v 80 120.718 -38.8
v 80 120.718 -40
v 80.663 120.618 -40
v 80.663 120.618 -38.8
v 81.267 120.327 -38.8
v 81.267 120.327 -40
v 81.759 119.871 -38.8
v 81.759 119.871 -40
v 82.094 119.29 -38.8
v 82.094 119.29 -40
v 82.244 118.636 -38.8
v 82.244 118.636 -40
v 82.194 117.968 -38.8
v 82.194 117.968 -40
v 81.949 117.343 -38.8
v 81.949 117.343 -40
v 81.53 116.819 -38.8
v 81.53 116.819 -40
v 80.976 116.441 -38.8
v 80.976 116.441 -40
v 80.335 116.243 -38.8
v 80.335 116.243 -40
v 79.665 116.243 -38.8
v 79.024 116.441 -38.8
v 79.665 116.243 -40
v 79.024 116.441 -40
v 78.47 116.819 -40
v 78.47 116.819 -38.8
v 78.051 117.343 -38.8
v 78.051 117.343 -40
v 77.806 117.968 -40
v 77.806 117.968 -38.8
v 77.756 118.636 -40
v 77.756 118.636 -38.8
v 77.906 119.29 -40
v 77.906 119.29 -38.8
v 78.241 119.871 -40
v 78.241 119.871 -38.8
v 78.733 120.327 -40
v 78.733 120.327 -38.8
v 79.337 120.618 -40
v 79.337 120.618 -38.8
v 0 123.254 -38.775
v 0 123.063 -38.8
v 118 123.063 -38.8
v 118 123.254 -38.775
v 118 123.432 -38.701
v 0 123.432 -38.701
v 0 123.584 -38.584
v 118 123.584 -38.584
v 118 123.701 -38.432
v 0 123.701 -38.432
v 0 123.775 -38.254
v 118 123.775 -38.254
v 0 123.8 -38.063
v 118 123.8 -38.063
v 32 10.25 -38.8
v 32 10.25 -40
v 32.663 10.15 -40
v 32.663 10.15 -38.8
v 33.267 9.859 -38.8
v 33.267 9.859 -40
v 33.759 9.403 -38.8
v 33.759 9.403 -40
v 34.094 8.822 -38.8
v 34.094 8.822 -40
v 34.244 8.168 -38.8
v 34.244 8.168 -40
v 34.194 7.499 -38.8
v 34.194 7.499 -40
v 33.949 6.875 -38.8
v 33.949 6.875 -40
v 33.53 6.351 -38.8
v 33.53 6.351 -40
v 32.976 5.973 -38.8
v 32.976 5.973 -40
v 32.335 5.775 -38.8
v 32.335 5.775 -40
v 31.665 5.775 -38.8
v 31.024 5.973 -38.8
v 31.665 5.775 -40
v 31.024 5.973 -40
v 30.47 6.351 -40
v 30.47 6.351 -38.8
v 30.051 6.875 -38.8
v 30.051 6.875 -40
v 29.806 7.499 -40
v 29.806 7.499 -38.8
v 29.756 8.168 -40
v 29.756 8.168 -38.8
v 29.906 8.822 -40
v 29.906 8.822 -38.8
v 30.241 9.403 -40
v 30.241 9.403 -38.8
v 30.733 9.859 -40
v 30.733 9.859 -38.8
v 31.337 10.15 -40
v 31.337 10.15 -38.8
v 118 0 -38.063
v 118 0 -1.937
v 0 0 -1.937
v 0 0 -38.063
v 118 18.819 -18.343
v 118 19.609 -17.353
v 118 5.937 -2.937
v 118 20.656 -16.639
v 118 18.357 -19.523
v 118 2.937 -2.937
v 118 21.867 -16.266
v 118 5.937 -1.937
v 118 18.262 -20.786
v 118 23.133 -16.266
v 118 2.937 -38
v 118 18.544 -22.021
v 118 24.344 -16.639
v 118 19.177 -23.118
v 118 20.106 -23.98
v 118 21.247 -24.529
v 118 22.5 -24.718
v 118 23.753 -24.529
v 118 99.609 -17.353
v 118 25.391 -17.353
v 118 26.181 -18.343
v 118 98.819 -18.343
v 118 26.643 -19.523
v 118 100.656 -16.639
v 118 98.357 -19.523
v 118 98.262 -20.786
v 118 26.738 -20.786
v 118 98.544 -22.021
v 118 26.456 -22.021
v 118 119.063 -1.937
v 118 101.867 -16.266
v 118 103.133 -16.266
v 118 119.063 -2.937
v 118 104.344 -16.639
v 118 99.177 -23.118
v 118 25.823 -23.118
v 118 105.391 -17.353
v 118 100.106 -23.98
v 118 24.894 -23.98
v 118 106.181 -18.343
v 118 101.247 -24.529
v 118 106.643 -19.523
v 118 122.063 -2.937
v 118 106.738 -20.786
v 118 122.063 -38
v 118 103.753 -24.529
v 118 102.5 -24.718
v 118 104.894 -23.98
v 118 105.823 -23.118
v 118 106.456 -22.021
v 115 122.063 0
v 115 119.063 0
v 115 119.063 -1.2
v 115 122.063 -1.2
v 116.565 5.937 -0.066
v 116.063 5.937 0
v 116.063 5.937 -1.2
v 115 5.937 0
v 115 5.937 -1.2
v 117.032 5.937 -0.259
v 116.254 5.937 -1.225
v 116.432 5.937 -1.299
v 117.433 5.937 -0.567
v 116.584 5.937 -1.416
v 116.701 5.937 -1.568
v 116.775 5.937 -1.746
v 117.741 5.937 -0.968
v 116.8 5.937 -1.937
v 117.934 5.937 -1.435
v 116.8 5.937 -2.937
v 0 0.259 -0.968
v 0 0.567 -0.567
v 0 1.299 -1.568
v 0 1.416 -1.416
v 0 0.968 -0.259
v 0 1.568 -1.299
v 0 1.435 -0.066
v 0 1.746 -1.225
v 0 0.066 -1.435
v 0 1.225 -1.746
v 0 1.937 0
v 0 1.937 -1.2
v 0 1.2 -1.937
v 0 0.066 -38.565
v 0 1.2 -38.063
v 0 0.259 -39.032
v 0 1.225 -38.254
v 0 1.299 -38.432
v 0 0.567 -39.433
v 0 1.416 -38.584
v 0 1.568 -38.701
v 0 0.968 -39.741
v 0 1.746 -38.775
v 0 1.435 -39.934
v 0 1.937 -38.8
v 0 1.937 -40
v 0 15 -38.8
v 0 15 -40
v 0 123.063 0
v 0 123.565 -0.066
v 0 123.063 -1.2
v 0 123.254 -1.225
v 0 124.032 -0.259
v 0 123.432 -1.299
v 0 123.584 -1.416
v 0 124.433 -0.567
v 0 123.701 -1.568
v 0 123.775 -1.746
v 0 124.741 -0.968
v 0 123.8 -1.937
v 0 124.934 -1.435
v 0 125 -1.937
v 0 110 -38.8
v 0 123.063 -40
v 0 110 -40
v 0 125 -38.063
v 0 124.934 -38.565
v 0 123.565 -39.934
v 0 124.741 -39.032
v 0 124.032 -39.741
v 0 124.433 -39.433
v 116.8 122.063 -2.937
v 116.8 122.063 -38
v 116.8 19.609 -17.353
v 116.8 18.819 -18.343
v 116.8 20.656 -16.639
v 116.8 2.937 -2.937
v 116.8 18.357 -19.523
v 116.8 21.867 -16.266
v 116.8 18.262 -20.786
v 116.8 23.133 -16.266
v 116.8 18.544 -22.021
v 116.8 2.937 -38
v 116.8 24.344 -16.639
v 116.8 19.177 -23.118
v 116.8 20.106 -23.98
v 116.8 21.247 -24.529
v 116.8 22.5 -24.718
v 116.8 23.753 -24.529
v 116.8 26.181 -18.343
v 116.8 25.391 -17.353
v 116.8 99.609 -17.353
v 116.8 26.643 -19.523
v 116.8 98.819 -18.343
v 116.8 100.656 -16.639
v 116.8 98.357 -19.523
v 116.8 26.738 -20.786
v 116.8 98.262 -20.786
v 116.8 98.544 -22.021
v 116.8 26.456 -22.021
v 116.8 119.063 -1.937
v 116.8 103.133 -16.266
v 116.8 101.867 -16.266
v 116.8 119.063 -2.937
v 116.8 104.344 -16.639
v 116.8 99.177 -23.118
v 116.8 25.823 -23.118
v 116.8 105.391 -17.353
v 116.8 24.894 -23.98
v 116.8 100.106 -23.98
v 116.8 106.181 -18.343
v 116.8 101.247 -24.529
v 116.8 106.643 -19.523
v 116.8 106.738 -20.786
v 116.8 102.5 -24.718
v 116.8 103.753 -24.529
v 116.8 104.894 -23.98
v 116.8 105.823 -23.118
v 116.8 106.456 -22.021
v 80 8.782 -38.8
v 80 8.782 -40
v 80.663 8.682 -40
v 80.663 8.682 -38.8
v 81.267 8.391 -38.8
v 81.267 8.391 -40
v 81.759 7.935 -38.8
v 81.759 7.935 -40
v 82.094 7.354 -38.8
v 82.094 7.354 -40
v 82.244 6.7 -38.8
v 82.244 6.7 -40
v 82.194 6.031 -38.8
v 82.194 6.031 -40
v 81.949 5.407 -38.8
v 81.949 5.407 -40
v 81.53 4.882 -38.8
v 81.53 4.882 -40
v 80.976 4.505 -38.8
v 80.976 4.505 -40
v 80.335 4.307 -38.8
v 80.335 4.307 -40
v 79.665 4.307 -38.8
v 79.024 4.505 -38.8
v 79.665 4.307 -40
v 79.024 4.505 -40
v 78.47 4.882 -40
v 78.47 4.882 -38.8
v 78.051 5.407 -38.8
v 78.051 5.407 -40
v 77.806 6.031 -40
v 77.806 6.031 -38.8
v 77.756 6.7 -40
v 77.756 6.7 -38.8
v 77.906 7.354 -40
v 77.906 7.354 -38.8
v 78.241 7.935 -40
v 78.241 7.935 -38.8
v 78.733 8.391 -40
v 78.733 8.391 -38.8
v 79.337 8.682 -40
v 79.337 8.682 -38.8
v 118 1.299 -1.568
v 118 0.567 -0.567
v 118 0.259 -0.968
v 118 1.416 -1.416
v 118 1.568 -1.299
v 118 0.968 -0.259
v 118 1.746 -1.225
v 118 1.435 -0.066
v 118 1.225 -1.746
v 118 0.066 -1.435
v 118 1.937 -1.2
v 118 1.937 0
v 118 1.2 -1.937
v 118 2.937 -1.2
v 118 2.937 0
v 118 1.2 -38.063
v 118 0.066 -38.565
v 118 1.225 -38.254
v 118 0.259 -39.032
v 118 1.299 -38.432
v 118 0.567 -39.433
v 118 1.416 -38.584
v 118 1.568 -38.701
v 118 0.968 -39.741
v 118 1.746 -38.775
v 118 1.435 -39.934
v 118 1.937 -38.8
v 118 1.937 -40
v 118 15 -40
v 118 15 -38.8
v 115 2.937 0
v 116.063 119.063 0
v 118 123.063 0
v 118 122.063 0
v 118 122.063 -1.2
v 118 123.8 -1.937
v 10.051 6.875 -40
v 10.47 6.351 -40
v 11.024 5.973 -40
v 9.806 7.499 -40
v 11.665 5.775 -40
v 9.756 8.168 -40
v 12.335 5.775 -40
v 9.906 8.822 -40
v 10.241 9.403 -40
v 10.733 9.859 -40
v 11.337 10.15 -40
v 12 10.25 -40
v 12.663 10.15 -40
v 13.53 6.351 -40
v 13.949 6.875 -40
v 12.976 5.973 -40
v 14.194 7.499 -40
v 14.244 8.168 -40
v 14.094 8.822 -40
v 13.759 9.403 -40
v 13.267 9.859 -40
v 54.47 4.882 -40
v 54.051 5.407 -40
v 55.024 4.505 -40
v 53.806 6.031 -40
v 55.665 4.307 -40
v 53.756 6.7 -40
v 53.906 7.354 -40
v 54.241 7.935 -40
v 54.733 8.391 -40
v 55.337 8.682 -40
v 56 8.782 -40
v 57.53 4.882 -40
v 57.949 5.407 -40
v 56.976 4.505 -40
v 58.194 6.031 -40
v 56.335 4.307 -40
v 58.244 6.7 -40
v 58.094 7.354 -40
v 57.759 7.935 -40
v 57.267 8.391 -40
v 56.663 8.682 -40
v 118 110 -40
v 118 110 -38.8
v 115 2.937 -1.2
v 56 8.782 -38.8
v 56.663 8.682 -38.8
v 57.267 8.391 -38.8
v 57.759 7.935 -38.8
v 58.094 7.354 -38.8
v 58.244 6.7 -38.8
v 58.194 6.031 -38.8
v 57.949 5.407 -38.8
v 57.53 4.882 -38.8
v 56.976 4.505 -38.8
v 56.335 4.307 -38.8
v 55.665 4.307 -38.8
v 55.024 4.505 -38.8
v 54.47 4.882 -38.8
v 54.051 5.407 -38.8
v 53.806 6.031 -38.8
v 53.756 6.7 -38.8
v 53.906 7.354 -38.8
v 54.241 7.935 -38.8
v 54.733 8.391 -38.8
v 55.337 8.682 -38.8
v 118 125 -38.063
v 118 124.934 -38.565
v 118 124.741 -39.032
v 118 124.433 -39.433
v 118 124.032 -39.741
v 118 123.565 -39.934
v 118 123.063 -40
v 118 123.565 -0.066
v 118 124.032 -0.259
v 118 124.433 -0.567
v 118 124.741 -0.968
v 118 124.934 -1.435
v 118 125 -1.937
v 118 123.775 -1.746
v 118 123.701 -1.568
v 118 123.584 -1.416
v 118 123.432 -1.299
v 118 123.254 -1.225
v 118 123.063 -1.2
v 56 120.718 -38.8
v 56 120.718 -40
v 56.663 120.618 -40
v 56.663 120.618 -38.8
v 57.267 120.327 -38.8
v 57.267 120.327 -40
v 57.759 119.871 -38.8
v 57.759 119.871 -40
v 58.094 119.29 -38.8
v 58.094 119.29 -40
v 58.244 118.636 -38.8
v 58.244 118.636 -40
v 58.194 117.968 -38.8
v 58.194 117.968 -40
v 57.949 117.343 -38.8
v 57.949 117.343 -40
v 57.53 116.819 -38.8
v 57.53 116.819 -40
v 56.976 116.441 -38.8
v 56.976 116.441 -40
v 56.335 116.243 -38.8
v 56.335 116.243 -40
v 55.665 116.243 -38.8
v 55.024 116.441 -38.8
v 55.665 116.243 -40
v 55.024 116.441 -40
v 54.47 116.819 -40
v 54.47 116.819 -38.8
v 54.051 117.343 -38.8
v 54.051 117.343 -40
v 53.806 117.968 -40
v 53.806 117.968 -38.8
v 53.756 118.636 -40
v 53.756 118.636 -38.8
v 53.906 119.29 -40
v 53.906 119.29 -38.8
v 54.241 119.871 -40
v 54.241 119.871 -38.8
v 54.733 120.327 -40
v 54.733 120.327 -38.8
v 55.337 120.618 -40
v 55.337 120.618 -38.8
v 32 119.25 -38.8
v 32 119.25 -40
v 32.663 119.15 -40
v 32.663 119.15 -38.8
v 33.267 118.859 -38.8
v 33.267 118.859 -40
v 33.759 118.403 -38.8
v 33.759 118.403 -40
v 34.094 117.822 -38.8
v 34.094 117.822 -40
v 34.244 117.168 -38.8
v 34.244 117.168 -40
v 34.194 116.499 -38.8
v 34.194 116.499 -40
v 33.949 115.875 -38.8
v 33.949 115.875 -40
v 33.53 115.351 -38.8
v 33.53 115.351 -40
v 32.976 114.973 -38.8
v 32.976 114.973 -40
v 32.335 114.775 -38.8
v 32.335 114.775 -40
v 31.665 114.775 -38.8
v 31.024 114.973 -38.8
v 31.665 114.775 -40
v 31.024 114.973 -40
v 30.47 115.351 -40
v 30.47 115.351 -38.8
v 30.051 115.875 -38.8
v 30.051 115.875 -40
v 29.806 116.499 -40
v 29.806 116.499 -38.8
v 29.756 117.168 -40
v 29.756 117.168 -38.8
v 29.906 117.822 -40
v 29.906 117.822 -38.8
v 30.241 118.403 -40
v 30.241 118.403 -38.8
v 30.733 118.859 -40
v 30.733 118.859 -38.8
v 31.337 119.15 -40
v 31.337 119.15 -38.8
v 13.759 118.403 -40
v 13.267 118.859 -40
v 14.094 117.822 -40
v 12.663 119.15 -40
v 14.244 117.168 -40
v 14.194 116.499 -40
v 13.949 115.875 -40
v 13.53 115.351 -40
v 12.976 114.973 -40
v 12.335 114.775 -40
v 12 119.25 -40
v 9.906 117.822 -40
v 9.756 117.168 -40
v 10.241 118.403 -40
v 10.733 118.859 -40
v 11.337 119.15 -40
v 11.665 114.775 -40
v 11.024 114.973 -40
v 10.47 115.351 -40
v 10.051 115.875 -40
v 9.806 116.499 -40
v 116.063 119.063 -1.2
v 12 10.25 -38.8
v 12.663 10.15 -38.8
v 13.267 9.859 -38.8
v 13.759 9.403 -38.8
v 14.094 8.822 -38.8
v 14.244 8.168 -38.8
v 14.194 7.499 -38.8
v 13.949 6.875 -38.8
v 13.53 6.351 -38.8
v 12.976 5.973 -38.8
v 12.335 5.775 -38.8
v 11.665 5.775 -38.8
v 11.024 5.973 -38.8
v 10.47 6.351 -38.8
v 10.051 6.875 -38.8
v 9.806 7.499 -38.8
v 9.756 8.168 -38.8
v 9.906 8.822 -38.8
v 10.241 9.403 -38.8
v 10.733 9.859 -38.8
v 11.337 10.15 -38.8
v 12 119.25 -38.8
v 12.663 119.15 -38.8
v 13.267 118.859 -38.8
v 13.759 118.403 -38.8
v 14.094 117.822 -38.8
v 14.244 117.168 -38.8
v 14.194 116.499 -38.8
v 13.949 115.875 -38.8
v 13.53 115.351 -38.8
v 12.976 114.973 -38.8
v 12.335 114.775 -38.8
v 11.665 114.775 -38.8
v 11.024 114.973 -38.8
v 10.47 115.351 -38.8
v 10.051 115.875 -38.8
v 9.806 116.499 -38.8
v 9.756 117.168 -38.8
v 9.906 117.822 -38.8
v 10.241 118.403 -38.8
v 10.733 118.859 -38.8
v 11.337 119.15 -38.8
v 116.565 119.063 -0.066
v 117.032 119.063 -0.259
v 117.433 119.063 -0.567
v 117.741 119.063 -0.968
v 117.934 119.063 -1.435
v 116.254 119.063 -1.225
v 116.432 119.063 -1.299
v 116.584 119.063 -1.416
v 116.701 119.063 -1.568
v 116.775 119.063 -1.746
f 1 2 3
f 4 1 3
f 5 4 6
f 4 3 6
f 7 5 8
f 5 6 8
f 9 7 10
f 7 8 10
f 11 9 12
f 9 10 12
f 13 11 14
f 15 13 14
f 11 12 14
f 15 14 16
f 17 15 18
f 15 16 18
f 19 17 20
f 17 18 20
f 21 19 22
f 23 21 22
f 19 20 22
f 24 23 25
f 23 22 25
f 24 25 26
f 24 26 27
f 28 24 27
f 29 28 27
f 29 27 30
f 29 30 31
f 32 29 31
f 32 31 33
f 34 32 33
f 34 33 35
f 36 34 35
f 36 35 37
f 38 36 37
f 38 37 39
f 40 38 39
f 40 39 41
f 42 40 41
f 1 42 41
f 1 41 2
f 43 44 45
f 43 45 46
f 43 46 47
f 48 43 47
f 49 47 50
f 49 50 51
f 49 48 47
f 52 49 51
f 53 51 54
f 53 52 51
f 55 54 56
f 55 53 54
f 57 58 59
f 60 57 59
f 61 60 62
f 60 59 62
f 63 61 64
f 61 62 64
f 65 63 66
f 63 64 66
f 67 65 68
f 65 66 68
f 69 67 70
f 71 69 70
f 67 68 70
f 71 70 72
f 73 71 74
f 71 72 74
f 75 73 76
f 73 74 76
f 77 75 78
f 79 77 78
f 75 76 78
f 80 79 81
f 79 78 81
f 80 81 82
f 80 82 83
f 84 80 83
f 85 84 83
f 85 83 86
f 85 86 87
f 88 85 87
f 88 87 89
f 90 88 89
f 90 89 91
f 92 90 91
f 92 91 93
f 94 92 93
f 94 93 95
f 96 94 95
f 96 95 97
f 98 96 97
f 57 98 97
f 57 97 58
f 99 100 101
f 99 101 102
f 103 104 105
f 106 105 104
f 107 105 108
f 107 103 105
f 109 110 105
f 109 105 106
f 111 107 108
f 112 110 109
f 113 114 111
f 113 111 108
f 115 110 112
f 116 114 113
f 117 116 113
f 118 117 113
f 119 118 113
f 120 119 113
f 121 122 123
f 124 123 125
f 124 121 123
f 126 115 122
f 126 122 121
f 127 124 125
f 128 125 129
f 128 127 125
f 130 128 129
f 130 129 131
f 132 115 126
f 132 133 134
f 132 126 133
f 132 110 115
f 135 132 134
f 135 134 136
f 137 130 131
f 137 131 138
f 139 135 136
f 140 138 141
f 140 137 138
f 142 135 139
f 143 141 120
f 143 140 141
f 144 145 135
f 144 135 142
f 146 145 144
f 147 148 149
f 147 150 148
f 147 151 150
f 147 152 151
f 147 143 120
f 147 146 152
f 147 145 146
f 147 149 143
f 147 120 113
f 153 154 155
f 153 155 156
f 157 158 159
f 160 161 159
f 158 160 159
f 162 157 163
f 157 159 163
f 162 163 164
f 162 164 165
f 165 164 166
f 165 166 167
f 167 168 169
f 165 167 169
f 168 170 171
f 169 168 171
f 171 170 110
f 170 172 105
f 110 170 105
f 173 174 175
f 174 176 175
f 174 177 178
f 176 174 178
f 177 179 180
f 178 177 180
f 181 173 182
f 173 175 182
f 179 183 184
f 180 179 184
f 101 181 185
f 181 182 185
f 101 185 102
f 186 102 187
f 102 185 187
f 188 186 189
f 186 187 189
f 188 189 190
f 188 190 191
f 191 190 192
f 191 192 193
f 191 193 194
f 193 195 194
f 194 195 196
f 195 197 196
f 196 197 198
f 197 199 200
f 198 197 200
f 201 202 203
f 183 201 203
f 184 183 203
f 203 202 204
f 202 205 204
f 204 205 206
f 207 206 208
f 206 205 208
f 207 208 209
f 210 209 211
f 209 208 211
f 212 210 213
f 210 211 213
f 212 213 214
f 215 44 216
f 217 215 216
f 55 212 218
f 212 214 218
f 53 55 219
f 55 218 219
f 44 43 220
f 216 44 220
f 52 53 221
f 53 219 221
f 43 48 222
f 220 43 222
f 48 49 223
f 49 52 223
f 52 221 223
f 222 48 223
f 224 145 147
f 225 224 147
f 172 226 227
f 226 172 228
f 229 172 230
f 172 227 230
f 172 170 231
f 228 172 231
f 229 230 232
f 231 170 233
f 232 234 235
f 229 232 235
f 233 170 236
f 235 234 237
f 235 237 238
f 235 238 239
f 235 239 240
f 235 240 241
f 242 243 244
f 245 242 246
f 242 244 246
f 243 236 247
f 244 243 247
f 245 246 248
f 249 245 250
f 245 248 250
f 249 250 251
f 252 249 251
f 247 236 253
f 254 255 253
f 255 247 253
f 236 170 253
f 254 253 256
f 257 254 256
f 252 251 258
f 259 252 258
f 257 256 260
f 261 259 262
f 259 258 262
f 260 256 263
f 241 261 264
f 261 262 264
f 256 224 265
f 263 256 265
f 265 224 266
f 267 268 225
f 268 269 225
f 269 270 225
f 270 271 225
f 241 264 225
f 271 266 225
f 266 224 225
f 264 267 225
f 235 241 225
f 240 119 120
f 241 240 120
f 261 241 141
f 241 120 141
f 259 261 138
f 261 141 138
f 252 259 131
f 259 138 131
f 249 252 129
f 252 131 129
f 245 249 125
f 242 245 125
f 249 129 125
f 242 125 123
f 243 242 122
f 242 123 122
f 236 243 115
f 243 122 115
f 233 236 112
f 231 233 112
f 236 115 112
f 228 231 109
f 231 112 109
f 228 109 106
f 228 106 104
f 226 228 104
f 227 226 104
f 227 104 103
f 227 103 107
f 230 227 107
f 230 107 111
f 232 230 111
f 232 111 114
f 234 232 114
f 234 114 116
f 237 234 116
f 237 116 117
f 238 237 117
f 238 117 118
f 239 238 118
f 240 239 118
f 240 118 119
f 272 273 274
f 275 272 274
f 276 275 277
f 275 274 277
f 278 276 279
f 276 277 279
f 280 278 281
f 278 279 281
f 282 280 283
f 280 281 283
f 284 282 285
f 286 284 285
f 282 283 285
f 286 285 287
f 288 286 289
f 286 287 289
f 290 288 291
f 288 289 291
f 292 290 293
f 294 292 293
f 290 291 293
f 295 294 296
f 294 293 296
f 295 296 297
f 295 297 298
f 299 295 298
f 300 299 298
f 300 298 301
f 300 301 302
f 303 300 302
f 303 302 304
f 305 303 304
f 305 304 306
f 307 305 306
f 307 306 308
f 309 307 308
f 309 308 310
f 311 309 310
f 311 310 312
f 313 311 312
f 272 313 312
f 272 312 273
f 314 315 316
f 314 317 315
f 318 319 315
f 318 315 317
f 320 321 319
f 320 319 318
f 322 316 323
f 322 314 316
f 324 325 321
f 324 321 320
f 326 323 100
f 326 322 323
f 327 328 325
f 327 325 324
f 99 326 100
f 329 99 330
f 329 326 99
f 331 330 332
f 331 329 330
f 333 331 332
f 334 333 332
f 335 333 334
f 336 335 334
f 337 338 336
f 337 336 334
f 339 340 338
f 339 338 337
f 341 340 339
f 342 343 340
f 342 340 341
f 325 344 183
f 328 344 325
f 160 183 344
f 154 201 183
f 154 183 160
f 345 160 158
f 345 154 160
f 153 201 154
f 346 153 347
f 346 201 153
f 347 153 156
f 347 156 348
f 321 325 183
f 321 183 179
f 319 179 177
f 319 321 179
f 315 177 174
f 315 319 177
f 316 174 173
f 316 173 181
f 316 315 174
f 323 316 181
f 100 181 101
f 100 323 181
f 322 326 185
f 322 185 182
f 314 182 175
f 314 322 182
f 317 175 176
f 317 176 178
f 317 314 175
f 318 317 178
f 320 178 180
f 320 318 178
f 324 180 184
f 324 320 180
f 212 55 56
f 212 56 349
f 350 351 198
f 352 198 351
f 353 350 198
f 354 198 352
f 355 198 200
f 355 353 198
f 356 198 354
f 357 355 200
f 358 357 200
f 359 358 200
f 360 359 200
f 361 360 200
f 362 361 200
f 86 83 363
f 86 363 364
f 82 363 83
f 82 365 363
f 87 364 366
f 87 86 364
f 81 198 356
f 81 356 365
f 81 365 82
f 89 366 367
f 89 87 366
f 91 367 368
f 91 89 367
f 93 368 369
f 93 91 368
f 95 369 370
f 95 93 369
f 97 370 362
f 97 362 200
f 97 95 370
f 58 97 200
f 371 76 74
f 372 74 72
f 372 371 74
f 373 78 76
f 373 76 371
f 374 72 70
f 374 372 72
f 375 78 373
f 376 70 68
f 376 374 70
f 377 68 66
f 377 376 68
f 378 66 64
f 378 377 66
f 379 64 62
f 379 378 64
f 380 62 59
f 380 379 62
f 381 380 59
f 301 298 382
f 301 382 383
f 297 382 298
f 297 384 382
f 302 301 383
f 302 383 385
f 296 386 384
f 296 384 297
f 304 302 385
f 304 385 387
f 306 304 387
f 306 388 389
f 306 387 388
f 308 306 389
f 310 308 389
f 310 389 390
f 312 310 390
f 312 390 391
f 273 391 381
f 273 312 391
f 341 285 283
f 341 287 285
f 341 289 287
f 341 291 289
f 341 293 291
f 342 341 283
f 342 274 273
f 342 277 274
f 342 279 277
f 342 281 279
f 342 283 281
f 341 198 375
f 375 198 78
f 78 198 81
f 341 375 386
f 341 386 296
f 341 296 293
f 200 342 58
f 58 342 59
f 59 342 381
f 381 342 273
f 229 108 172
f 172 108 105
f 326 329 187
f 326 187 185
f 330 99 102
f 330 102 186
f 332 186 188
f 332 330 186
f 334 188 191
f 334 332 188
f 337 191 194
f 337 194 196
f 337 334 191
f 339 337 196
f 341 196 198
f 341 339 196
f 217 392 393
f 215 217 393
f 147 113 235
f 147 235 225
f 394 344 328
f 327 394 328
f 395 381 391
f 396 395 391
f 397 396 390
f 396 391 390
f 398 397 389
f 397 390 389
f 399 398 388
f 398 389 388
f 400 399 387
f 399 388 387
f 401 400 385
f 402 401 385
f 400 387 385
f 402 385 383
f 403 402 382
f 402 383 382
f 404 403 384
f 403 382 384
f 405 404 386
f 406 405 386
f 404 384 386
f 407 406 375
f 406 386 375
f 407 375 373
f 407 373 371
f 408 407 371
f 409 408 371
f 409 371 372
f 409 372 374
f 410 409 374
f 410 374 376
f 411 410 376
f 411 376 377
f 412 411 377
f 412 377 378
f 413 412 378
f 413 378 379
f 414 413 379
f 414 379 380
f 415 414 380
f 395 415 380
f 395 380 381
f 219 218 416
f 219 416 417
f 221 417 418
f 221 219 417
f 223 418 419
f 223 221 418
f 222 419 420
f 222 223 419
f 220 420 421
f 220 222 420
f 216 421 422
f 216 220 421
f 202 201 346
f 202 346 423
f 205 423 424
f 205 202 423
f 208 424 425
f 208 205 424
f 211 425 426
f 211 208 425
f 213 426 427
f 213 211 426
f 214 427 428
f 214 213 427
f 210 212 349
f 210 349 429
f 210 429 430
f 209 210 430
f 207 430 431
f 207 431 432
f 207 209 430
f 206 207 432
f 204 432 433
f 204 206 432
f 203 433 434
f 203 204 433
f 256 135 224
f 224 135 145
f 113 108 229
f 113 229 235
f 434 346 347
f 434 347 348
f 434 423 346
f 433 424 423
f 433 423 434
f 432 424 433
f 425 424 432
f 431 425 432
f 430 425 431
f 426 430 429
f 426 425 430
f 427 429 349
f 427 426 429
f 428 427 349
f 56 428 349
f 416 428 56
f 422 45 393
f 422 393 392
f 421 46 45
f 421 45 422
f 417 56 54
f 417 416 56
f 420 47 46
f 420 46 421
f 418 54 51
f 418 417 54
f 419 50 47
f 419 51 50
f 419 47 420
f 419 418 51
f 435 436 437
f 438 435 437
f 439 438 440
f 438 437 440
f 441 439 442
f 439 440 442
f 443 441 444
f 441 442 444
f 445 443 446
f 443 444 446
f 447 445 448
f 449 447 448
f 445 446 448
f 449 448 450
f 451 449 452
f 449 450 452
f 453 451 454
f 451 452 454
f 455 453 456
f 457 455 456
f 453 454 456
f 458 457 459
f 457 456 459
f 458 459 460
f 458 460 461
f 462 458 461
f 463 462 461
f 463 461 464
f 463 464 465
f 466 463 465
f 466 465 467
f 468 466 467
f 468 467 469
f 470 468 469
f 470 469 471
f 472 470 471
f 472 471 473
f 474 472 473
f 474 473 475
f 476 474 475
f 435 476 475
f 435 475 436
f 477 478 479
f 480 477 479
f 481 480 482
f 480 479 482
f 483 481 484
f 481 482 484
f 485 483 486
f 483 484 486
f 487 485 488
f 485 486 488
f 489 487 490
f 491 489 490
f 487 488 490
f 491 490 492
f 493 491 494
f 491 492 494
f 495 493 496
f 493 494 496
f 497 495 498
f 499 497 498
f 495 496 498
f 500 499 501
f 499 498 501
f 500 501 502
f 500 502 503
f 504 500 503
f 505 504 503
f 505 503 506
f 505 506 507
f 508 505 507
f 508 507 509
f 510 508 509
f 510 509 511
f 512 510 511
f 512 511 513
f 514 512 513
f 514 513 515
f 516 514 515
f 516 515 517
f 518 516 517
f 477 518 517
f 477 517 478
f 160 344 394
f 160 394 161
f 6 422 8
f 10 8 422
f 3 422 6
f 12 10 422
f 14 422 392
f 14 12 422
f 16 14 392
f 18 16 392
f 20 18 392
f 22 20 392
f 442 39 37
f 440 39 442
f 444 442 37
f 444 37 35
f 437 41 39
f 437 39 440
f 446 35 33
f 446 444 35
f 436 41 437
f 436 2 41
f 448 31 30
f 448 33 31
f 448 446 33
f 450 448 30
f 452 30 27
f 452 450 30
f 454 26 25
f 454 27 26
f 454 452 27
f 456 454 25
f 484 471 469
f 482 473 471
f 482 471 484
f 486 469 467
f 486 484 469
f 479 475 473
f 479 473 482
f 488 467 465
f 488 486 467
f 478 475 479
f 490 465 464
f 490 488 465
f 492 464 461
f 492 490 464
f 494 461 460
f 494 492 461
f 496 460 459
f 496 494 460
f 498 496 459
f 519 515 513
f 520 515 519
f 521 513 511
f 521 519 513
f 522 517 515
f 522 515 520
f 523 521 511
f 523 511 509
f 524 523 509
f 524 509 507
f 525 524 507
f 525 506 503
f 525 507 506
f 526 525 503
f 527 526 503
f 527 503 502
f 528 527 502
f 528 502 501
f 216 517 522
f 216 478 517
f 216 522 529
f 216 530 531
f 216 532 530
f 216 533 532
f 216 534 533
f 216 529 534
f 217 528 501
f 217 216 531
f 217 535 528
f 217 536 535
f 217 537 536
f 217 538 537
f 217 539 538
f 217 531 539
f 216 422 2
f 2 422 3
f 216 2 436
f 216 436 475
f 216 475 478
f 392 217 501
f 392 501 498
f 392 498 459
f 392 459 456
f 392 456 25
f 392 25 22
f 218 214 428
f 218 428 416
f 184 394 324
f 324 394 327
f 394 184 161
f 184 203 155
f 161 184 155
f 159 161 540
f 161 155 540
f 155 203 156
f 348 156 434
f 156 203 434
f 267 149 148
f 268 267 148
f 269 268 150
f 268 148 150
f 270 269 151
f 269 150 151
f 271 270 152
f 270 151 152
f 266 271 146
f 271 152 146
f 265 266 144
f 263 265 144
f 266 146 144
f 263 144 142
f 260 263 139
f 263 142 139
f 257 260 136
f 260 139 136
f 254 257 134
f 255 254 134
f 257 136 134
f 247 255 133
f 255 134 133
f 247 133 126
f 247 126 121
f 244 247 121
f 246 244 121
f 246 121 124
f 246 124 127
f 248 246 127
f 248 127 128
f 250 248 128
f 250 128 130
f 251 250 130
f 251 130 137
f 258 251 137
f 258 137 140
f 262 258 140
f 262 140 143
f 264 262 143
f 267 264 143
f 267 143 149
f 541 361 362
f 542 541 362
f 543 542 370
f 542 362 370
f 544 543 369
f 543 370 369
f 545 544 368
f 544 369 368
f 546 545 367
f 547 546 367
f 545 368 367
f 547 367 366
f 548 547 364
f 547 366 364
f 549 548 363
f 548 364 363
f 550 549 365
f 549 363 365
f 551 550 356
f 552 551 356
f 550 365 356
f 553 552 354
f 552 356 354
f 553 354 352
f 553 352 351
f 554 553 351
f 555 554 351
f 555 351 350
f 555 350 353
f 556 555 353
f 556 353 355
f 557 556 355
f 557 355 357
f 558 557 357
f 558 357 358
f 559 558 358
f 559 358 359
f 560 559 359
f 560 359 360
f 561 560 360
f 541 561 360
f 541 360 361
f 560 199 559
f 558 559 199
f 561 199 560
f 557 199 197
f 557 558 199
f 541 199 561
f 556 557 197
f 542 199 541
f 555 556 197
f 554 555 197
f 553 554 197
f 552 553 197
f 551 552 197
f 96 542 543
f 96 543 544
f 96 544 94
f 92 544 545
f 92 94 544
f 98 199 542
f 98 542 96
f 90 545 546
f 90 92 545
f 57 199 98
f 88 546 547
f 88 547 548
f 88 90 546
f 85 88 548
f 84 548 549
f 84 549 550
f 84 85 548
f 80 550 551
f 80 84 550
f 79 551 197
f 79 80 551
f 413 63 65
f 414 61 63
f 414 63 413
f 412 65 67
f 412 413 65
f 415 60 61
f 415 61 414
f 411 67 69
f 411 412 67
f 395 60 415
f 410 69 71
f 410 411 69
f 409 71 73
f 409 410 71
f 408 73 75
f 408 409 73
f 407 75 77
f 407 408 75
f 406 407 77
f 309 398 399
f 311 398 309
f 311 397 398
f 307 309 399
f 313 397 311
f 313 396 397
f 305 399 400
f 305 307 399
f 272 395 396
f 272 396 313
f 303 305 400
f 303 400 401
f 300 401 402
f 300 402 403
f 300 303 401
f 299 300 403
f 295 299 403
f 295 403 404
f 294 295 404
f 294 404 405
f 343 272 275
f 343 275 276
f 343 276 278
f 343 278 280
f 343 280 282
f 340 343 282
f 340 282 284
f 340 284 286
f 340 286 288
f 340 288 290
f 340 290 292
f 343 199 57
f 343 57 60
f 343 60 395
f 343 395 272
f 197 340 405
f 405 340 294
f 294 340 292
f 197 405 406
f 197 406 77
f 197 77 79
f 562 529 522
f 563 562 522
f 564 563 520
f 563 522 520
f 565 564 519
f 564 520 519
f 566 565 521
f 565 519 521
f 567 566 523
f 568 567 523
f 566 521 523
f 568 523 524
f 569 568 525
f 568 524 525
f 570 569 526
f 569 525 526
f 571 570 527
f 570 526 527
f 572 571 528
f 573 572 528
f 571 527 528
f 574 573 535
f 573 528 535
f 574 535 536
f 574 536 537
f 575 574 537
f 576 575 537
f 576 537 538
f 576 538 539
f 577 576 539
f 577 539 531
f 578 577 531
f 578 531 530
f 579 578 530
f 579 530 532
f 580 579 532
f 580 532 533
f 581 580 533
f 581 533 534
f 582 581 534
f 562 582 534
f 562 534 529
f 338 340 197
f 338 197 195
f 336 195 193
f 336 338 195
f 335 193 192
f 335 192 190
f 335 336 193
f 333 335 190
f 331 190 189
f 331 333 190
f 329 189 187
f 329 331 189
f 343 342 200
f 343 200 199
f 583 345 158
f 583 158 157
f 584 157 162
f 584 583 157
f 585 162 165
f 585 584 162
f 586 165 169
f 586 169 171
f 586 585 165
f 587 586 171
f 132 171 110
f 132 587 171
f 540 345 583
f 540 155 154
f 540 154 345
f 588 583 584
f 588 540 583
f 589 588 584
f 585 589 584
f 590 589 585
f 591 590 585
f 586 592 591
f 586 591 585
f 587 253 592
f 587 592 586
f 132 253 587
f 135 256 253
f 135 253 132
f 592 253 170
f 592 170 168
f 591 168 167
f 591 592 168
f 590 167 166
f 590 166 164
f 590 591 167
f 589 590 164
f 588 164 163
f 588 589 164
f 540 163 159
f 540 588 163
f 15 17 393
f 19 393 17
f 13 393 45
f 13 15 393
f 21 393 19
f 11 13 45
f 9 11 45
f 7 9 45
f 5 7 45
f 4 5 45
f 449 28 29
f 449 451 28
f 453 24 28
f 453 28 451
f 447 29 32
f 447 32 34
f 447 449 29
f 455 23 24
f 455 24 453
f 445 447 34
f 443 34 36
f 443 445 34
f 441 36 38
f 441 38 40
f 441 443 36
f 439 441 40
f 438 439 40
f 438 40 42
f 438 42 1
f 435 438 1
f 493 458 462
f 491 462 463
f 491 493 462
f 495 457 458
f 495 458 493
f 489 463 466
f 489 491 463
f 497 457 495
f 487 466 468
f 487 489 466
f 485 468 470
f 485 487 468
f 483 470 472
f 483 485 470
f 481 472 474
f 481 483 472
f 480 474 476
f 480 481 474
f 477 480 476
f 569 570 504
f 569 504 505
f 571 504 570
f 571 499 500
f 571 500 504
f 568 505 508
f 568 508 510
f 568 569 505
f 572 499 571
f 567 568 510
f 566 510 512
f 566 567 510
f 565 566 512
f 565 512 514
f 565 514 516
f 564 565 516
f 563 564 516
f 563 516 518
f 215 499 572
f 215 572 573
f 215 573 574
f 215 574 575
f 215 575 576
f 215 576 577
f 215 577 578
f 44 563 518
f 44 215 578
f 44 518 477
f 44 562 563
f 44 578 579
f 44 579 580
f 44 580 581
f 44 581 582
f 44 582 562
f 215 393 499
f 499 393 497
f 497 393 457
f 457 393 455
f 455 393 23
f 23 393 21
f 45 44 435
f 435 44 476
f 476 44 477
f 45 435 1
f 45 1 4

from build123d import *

# Parameters (mm, degrees)
SKETCH_1_W                       = 118
SKETCH_1_H                       = 125
SM_BASE_FLANGE_1_DEPTH           = 1.2
SM_EDGE_FLANGE_2_STRIP_W         = 6.2732
SM_EDGE_FLANGE_2_STRIP_H         = 1.2
SM_EDGE_FLANGE_2_STRIP_CUT_DEPTH = 118
SM_EDGE_FLANGE_2_DEPTH           = 118
SM_EDGE_FLANGE_3_STRIP_W         = 6.2732
SM_EDGE_FLANGE_3_STRIP_H         = 1.2
SM_EDGE_FLANGE_3_STRIP_CUT_DEPTH = 118
SM_EDGE_FLANGE_3_DEPTH           = 118
SM_EDGE_FLANGE_4_STRIP_W         = 6.2732
SM_EDGE_FLANGE_4_STRIP_H         = 1.2
SM_EDGE_FLANGE_4_STRIP_CUT_DEPTH = 118
SM_EDGE_FLANGE_4_DEPTH           = 118
SM_EDGE_FLANGE_5_STRIP_W         = 6.2732
SM_EDGE_FLANGE_5_STRIP_H         = 1.2
SM_EDGE_FLANGE_5_STRIP_CUT_DEPTH = 118
SM_EDGE_FLANGE_5_DEPTH           = 118
CUT_EXTRUDE_2_REACH              = 178.491
SKETCH_22_W                      = 3
SKETCH_22_H                      = 3
SM_EDGE_FLANGE_6_STRIP_W         = 6.2732
SM_EDGE_FLANGE_6_STRIP_H         = 1.2
SM_EDGE_FLANGE_6_STRIP_CUT_DEPTH = 113.1268
SM_EDGE_FLANGE_6_DEPTH           = 113.1268
SKETCH_26_W                      = 35.0634
SKETCH_26_H                      = 3
EXTRUDE_1_DEPTH                  = 1.2
CUT_EXTRUDE_3_REACH              = 178.491
SKETCH_27_R                      = 4.25
CUT_EXTRUDE_4_REACH              = 178.491
SKETCH_28_R                      = 2.25
CUT_EXTRUDE_5_REACH              = 178.491
SKETCH_29_R                      = 2.25


# Sheet-metal steps are written as plain solids
with BuildPart() as part:
    # Sketch 1 → Базовая кромка1 (new body)
    with BuildSketch(Plane.XY):
        with Locations((59, 62.5)):
            Rectangle(SKETCH_1_W, SKETCH_1_H)
    extrude(amount=-SM_BASE_FLANGE_1_DEPTH)

    # Ребро-кромка2 strip (across the edge) → Ребро-кромка2 strip cut (cut)
    with BuildSketch(Plane(origin=(118, 0, -1.2), x_dir=(0, 1, 0), z_dir=(-1, 0, 0))):
        with Locations((-1.2, -0.6)):
            Rectangle(SM_EDGE_FLANGE_2_STRIP_W, SM_EDGE_FLANGE_2_STRIP_H)
    extrude(amount=SM_EDGE_FLANGE_2_STRIP_CUT_DEPTH, mode=Mode.SUBTRACT)

    # Ребро-кромка2 section (across the edge) → Ребро-кромка2 (add)
    with BuildSketch(Plane(origin=(118, 0, -1.2), x_dir=(0, 1, 0), z_dir=(-1, 0, 0))):
        with BuildLine():
            Line((0, 0.7366), (0, 38.8))
            Line((0, 38.8), (1.2, 38.8))
            Line((1.2, 38.8), (1.2, 0.7366))
            ThreePointArc((1.2, 0.7366), (1.415745145, 0.215745145), (1.9366, 0))
            Line((1.9366, 0), (1.9366, -1.2))
            ThreePointArc((1.9366, -1.2), (0.567217008, -0.632782992), (0, 0.7366))
        make_face()
    extrude(amount=SM_EDGE_FLANGE_2_DEPTH)

    # Ребро-кромка3 strip (across the edge) → Ребро-кромка3 strip cut (cut)
    with BuildSketch(Plane(origin=(0, 125, -1.2), x_dir=(0, -1, 0), z_dir=(1, 0, 0))):
        with Locations((-1.2, -0.6)):
            Rectangle(SM_EDGE_FLANGE_3_STRIP_W, SM_EDGE_FLANGE_3_STRIP_H)
    extrude(amount=SM_EDGE_FLANGE_3_STRIP_CUT_DEPTH, mode=Mode.SUBTRACT)

    # Ребро-кромка3 section (across the edge) → Ребро-кромка3 (add)
    with BuildSketch(Plane(origin=(0, 125, -1.2), x_dir=(0, -1, 0), z_dir=(1, 0, 0))):
        with BuildLine():
            Line((0, 0.7366), (0, 38.8))
            Line((0, 38.8), (1.2, 38.8))
            Line((1.2, 38.8), (1.2, 0.7366))
            ThreePointArc((1.2, 0.7366), (1.415745145, 0.215745145), (1.9366, 0))
            Line((1.9366, 0), (1.9366, -1.2))
            ThreePointArc((1.9366, -1.2), (0.567217008, -0.632782992), (0, 0.7366))
        make_face()
    extrude(amount=SM_EDGE_FLANGE_3_DEPTH)

    # Ребро-кромка4 strip (across the edge) → Ребро-кромка4 strip cut (cut)
    with BuildSketch(Plane(origin=(0, 123.8, -40), x_dir=(0, 0, 1), z_dir=(1, 0, 0))):
        with Locations((-1.2, -0.6)):
            Rectangle(SM_EDGE_FLANGE_4_STRIP_W, SM_EDGE_FLANGE_4_STRIP_H)
    extrude(amount=SM_EDGE_FLANGE_4_STRIP_CUT_DEPTH, mode=Mode.SUBTRACT)

    # Ребро-кромка4 section (across the edge) → Ребро-кромка4 (add)
    with BuildSketch(Plane(origin=(0, 123.8, -40), x_dir=(0, 0, 1), z_dir=(1, 0, 0))):
        with BuildLine():
            Line((0, 0.7366), (0, 13.8))
            Line((0, 13.8), (1.2, 13.8))
            Line((1.2, 13.8), (1.2, 0.7366))
            ThreePointArc((1.2, 0.7366), (1.415745145, 0.215745145), (1.9366, 0))
            Line((1.9366, 0), (1.9366, -1.2))
            ThreePointArc((1.9366, -1.2), (0.567217008, -0.632782992), (0, 0.7366))
        make_face()
    extrude(amount=SM_EDGE_FLANGE_4_DEPTH)

    # Ребро-кромка5 strip (across the edge) → Ребро-кромка5 strip cut (cut)
    with BuildSketch(Plane(origin=(118, 1.2, -40), x_dir=(0, 0, 1), z_dir=(-1, 0, 0))):
        with Locations((-1.2, -0.6)):
            Rectangle(SM_EDGE_FLANGE_5_STRIP_W, SM_EDGE_FLANGE_5_STRIP_H)
    extrude(amount=SM_EDGE_FLANGE_5_STRIP_CUT_DEPTH, mode=Mode.SUBTRACT)

    # Ребро-кромка5 section (across the edge) → Ребро-кромка5 (add)
    with BuildSketch(Plane(origin=(118, 1.2, -40), x_dir=(0, 0, 1), z_dir=(-1, 0, 0))):
        with BuildLine():
            Line((0, 0.7366), (0, 13.8))
            Line((0, 13.8), (1.2, 13.8))
            Line((1.2, 13.8), (1.2, 0.7366))
            ThreePointArc((1.2, 0.7366), (1.415745145, 0.215745145), (1.9366, 0))
            Line((1.9366, 0), (1.9366, -1.2))
            ThreePointArc((1.9366, -1.2), (0.567217008, -0.632782992), (0, 0.7366))
        make_face()
    extrude(amount=SM_EDGE_FLANGE_5_DEPTH)

    # Эскиз22 → Вырез-Вытянуть2 (cut, up to next)
    with BuildSketch(Plane.XY, mode=Mode.PRIVATE) as cut_extrude_2_sk1:
        with Locations((116.5, 120.5634)):
            Rectangle(SKETCH_22_W, SKETCH_22_H)
    cut_extrude_2_tool1 = extrude(cut_extrude_2_sk1.sketch, amount=-CUT_EXTRUDE_2_REACH, mode=Mode.PRIVATE) & part.part
    # Эскиз22 → Вырез-Вытянуть2 (cut, up to next)
    with BuildSketch(Plane.XY, mode=Mode.PRIVATE) as cut_extrude_2_sk2:
        with Locations((116.5, 4.4366)):
            Rectangle(SKETCH_22_W, SKETCH_22_H)
    cut_extrude_2_tool2 = extrude(cut_extrude_2_sk2.sketch, amount=-CUT_EXTRUDE_2_REACH, mode=Mode.PRIVATE) & part.part
    add(cut_extrude_2_tool1.solids().sort_by_distance((116.5, 120.5634, 0))[0], mode=Mode.SUBTRACT)
    add(cut_extrude_2_tool2.solids().sort_by_distance((116.5, 4.4366, 0))[0], mode=Mode.SUBTRACT)

    # Ребро-кромка6 strip (across the edge) → Ребро-кромка6 strip cut (cut)
    with BuildSketch(Plane(origin=(118, 119.0634, -1.2), x_dir=(-1, 0, 0), z_dir=(0, -1, 0))):
        with Locations((-1.2, -0.6)):
            Rectangle(SM_EDGE_FLANGE_6_STRIP_W, SM_EDGE_FLANGE_6_STRIP_H)
    extrude(amount=SM_EDGE_FLANGE_6_STRIP_CUT_DEPTH, mode=Mode.SUBTRACT)

    # Ребро-кромка6 section (across the edge) → Ребро-кромка6 (add)
    with BuildSketch(Plane(origin=(118, 119.0634, -1.2), x_dir=(-1, 0, 0), z_dir=(0, -1, 0))):
        with BuildLine():
            Line((0, 0.7366), (0, 36.8))
            Line((0, 36.8), (1.2, 36.8))
            Line((1.2, 36.8), (1.2, 0.7366))
            ThreePointArc((1.2, 0.7366), (1.415745145, 0.215745145), (1.9366, 0))
            Line((1.9366, 0), (1.9366, -1.2))
            ThreePointArc((1.9366, -1.2), (0.567217008, -0.632782992), (0, 0.7366))
        make_face()
    extrude(amount=SM_EDGE_FLANGE_6_DEPTH)

    # Эскиз26 → Бобышка-Вытянуть1 (add)
    with BuildSketch(Plane(origin=(118, 0, 0), x_dir=(0, 0, -1), z_dir=(1, 0, 0))):
        with Locations((20.4683, 120.5634)):
            Rectangle(SKETCH_26_W, SKETCH_26_H)
        with Locations((20.4683, 4.4366)):
            Rectangle(SKETCH_26_W, SKETCH_26_H)
    extrude(amount=-EXTRUDE_1_DEPTH)

    # Эскиз27 → Вырез-Вытянуть3 (cut, up to next)
    with BuildSketch(Plane(origin=(118, 0, 0), x_dir=(0, 0, -1), z_dir=(1, 0, 0)), mode=Mode.PRIVATE) as cut_extrude_3_sk1:
        with Locations((20.4683, 102.5)):
            Circle(SKETCH_27_R)
    cut_extrude_3_tool1 = extrude(cut_extrude_3_sk1.sketch, amount=-CUT_EXTRUDE_3_REACH, mode=Mode.PRIVATE) & part.part
    # Эскиз27 → Вырез-Вытянуть3 (cut, up to next)
    with BuildSketch(Plane(origin=(118, 0, 0), x_dir=(0, 0, -1), z_dir=(1, 0, 0)), mode=Mode.PRIVATE) as cut_extrude_3_sk2:
        with Locations((20.4683, 22.5)):
            Circle(SKETCH_27_R)
    cut_extrude_3_tool2 = extrude(cut_extrude_3_sk2.sketch, amount=-CUT_EXTRUDE_3_REACH, mode=Mode.PRIVATE) & part.part
    add(cut_extrude_3_tool1.solids().sort_by_distance((118, 102.5, -20.4683))[0], mode=Mode.SUBTRACT)
    add(cut_extrude_3_tool2.solids().sort_by_distance((118, 22.5, -20.4683))[0], mode=Mode.SUBTRACT)

    # Эскиз28 → Вырез-Вытянуть4 (cut, up to next)
    with BuildSketch(Plane(origin=(0, 0, -40), x_dir=(-1, 0, 0), z_dir=(0, 0, -1)), mode=Mode.PRIVATE) as cut_extrude_4_sk1:
        with Locations(Location((-80, 118.4683, 0), (0, 0, 90))):
            Circle(SKETCH_28_R)
    cut_extrude_4_tool1 = extrude(cut_extrude_4_sk1.sketch, amount=-CUT_EXTRUDE_4_REACH, mode=Mode.PRIVATE) & part.part
    # Эскиз28 → Вырез-Вытянуть4 (cut, up to next)
    with BuildSketch(Plane(origin=(0, 0, -40), x_dir=(-1, 0, 0), z_dir=(0, 0, -1)), mode=Mode.PRIVATE) as cut_extrude_4_sk2:
        with Locations(Location((-56, 118.4683, 0), (0, 0, 90))):
            Circle(SKETCH_28_R)
    cut_extrude_4_tool2 = extrude(cut_extrude_4_sk2.sketch, amount=-CUT_EXTRUDE_4_REACH, mode=Mode.PRIVATE) & part.part
    # Эскиз28 → Вырез-Вытянуть4 (cut, up to next)
    with BuildSketch(Plane(origin=(0, 0, -40), x_dir=(-1, 0, 0), z_dir=(0, 0, -1)), mode=Mode.PRIVATE) as cut_extrude_4_sk3:
        with Locations(Location((-80, 6.5317, 0), (0, 0, 90))):
            Circle(SKETCH_28_R)
    cut_extrude_4_tool3 = extrude(cut_extrude_4_sk3.sketch, amount=-CUT_EXTRUDE_4_REACH, mode=Mode.PRIVATE) & part.part
    # Эскиз28 → Вырез-Вытянуть4 (cut, up to next)
    with BuildSketch(Plane(origin=(0, 0, -40), x_dir=(-1, 0, 0), z_dir=(0, 0, -1)), mode=Mode.PRIVATE) as cut_extrude_4_sk4:
        with Locations(Location((-56, 6.5317, 0), (0, 0, 90))):
            Circle(SKETCH_28_R)
    cut_extrude_4_tool4 = extrude(cut_extrude_4_sk4.sketch, amount=-CUT_EXTRUDE_4_REACH, mode=Mode.PRIVATE) & part.part
    add(cut_extrude_4_tool1.solids().sort_by_distance((80, 118.4683, -40))[0], mode=Mode.SUBTRACT)
    add(cut_extrude_4_tool2.solids().sort_by_distance((56, 118.4683, -40))[0], mode=Mode.SUBTRACT)
    add(cut_extrude_4_tool3.solids().sort_by_distance((80, 6.5317, -40))[0], mode=Mode.SUBTRACT)
    add(cut_extrude_4_tool4.solids().sort_by_distance((56, 6.5317, -40))[0], mode=Mode.SUBTRACT)

    # Эскиз29 → Вырез-Вытянуть5 (cut, up to next)
    with BuildSketch(Plane(origin=(0, 0, -40), x_dir=(-1, 0, 0), z_dir=(0, 0, -1)), mode=Mode.PRIVATE) as cut_extrude_5_sk1:
        with Locations(Location((-32, 117, 0), (0, 0, 90))):
            Circle(SKETCH_29_R)
    cut_extrude_5_tool1 = extrude(cut_extrude_5_sk1.sketch, amount=-CUT_EXTRUDE_5_REACH, mode=Mode.PRIVATE) & part.part
    # Эскиз29 → Вырез-Вытянуть5 (cut, up to next)
    with BuildSketch(Plane(origin=(0, 0, -40), x_dir=(-1, 0, 0), z_dir=(0, 0, -1)), mode=Mode.PRIVATE) as cut_extrude_5_sk2:
        with Locations(Location((-12, 117, 0), (0, 0, 90))):
            Circle(SKETCH_29_R)
    cut_extrude_5_tool2 = extrude(cut_extrude_5_sk2.sketch, amount=-CUT_EXTRUDE_5_REACH, mode=Mode.PRIVATE) & part.part
    # Эскиз29 → Вырез-Вытянуть5 (cut, up to next)
    with BuildSketch(Plane(origin=(0, 0, -40), x_dir=(-1, 0, 0), z_dir=(0, 0, -1)), mode=Mode.PRIVATE) as cut_extrude_5_sk3:
        with Locations(Location((-32, 8, 0), (0, 0, 90))):
            Circle(SKETCH_29_R)
    cut_extrude_5_tool3 = extrude(cut_extrude_5_sk3.sketch, amount=-CUT_EXTRUDE_5_REACH, mode=Mode.PRIVATE) & part.part
    # Эскиз29 → Вырез-Вытянуть5 (cut, up to next)
    with BuildSketch(Plane(origin=(0, 0, -40), x_dir=(-1, 0, 0), z_dir=(0, 0, -1)), mode=Mode.PRIVATE) as cut_extrude_5_sk4:
        with Locations(Location((-12, 8, 0), (0, 0, 90))):
            Circle(SKETCH_29_R)
    cut_extrude_5_tool4 = extrude(cut_extrude_5_sk4.sketch, amount=-CUT_EXTRUDE_5_REACH, mode=Mode.PRIVATE) & part.part
    add(cut_extrude_5_tool1.solids().sort_by_distance((32, 117, -40))[0], mode=Mode.SUBTRACT)
    add(cut_extrude_5_tool2.solids().sort_by_distance((12, 117, -40))[0], mode=Mode.SUBTRACT)
    add(cut_extrude_5_tool3.solids().sort_by_distance((32, 8, -40))[0], mode=Mode.SUBTRACT)
    add(cut_extrude_5_tool4.solids().sort_by_distance((12, 8, -40))[0], mode=Mode.SUBTRACT)


solid = part.part
